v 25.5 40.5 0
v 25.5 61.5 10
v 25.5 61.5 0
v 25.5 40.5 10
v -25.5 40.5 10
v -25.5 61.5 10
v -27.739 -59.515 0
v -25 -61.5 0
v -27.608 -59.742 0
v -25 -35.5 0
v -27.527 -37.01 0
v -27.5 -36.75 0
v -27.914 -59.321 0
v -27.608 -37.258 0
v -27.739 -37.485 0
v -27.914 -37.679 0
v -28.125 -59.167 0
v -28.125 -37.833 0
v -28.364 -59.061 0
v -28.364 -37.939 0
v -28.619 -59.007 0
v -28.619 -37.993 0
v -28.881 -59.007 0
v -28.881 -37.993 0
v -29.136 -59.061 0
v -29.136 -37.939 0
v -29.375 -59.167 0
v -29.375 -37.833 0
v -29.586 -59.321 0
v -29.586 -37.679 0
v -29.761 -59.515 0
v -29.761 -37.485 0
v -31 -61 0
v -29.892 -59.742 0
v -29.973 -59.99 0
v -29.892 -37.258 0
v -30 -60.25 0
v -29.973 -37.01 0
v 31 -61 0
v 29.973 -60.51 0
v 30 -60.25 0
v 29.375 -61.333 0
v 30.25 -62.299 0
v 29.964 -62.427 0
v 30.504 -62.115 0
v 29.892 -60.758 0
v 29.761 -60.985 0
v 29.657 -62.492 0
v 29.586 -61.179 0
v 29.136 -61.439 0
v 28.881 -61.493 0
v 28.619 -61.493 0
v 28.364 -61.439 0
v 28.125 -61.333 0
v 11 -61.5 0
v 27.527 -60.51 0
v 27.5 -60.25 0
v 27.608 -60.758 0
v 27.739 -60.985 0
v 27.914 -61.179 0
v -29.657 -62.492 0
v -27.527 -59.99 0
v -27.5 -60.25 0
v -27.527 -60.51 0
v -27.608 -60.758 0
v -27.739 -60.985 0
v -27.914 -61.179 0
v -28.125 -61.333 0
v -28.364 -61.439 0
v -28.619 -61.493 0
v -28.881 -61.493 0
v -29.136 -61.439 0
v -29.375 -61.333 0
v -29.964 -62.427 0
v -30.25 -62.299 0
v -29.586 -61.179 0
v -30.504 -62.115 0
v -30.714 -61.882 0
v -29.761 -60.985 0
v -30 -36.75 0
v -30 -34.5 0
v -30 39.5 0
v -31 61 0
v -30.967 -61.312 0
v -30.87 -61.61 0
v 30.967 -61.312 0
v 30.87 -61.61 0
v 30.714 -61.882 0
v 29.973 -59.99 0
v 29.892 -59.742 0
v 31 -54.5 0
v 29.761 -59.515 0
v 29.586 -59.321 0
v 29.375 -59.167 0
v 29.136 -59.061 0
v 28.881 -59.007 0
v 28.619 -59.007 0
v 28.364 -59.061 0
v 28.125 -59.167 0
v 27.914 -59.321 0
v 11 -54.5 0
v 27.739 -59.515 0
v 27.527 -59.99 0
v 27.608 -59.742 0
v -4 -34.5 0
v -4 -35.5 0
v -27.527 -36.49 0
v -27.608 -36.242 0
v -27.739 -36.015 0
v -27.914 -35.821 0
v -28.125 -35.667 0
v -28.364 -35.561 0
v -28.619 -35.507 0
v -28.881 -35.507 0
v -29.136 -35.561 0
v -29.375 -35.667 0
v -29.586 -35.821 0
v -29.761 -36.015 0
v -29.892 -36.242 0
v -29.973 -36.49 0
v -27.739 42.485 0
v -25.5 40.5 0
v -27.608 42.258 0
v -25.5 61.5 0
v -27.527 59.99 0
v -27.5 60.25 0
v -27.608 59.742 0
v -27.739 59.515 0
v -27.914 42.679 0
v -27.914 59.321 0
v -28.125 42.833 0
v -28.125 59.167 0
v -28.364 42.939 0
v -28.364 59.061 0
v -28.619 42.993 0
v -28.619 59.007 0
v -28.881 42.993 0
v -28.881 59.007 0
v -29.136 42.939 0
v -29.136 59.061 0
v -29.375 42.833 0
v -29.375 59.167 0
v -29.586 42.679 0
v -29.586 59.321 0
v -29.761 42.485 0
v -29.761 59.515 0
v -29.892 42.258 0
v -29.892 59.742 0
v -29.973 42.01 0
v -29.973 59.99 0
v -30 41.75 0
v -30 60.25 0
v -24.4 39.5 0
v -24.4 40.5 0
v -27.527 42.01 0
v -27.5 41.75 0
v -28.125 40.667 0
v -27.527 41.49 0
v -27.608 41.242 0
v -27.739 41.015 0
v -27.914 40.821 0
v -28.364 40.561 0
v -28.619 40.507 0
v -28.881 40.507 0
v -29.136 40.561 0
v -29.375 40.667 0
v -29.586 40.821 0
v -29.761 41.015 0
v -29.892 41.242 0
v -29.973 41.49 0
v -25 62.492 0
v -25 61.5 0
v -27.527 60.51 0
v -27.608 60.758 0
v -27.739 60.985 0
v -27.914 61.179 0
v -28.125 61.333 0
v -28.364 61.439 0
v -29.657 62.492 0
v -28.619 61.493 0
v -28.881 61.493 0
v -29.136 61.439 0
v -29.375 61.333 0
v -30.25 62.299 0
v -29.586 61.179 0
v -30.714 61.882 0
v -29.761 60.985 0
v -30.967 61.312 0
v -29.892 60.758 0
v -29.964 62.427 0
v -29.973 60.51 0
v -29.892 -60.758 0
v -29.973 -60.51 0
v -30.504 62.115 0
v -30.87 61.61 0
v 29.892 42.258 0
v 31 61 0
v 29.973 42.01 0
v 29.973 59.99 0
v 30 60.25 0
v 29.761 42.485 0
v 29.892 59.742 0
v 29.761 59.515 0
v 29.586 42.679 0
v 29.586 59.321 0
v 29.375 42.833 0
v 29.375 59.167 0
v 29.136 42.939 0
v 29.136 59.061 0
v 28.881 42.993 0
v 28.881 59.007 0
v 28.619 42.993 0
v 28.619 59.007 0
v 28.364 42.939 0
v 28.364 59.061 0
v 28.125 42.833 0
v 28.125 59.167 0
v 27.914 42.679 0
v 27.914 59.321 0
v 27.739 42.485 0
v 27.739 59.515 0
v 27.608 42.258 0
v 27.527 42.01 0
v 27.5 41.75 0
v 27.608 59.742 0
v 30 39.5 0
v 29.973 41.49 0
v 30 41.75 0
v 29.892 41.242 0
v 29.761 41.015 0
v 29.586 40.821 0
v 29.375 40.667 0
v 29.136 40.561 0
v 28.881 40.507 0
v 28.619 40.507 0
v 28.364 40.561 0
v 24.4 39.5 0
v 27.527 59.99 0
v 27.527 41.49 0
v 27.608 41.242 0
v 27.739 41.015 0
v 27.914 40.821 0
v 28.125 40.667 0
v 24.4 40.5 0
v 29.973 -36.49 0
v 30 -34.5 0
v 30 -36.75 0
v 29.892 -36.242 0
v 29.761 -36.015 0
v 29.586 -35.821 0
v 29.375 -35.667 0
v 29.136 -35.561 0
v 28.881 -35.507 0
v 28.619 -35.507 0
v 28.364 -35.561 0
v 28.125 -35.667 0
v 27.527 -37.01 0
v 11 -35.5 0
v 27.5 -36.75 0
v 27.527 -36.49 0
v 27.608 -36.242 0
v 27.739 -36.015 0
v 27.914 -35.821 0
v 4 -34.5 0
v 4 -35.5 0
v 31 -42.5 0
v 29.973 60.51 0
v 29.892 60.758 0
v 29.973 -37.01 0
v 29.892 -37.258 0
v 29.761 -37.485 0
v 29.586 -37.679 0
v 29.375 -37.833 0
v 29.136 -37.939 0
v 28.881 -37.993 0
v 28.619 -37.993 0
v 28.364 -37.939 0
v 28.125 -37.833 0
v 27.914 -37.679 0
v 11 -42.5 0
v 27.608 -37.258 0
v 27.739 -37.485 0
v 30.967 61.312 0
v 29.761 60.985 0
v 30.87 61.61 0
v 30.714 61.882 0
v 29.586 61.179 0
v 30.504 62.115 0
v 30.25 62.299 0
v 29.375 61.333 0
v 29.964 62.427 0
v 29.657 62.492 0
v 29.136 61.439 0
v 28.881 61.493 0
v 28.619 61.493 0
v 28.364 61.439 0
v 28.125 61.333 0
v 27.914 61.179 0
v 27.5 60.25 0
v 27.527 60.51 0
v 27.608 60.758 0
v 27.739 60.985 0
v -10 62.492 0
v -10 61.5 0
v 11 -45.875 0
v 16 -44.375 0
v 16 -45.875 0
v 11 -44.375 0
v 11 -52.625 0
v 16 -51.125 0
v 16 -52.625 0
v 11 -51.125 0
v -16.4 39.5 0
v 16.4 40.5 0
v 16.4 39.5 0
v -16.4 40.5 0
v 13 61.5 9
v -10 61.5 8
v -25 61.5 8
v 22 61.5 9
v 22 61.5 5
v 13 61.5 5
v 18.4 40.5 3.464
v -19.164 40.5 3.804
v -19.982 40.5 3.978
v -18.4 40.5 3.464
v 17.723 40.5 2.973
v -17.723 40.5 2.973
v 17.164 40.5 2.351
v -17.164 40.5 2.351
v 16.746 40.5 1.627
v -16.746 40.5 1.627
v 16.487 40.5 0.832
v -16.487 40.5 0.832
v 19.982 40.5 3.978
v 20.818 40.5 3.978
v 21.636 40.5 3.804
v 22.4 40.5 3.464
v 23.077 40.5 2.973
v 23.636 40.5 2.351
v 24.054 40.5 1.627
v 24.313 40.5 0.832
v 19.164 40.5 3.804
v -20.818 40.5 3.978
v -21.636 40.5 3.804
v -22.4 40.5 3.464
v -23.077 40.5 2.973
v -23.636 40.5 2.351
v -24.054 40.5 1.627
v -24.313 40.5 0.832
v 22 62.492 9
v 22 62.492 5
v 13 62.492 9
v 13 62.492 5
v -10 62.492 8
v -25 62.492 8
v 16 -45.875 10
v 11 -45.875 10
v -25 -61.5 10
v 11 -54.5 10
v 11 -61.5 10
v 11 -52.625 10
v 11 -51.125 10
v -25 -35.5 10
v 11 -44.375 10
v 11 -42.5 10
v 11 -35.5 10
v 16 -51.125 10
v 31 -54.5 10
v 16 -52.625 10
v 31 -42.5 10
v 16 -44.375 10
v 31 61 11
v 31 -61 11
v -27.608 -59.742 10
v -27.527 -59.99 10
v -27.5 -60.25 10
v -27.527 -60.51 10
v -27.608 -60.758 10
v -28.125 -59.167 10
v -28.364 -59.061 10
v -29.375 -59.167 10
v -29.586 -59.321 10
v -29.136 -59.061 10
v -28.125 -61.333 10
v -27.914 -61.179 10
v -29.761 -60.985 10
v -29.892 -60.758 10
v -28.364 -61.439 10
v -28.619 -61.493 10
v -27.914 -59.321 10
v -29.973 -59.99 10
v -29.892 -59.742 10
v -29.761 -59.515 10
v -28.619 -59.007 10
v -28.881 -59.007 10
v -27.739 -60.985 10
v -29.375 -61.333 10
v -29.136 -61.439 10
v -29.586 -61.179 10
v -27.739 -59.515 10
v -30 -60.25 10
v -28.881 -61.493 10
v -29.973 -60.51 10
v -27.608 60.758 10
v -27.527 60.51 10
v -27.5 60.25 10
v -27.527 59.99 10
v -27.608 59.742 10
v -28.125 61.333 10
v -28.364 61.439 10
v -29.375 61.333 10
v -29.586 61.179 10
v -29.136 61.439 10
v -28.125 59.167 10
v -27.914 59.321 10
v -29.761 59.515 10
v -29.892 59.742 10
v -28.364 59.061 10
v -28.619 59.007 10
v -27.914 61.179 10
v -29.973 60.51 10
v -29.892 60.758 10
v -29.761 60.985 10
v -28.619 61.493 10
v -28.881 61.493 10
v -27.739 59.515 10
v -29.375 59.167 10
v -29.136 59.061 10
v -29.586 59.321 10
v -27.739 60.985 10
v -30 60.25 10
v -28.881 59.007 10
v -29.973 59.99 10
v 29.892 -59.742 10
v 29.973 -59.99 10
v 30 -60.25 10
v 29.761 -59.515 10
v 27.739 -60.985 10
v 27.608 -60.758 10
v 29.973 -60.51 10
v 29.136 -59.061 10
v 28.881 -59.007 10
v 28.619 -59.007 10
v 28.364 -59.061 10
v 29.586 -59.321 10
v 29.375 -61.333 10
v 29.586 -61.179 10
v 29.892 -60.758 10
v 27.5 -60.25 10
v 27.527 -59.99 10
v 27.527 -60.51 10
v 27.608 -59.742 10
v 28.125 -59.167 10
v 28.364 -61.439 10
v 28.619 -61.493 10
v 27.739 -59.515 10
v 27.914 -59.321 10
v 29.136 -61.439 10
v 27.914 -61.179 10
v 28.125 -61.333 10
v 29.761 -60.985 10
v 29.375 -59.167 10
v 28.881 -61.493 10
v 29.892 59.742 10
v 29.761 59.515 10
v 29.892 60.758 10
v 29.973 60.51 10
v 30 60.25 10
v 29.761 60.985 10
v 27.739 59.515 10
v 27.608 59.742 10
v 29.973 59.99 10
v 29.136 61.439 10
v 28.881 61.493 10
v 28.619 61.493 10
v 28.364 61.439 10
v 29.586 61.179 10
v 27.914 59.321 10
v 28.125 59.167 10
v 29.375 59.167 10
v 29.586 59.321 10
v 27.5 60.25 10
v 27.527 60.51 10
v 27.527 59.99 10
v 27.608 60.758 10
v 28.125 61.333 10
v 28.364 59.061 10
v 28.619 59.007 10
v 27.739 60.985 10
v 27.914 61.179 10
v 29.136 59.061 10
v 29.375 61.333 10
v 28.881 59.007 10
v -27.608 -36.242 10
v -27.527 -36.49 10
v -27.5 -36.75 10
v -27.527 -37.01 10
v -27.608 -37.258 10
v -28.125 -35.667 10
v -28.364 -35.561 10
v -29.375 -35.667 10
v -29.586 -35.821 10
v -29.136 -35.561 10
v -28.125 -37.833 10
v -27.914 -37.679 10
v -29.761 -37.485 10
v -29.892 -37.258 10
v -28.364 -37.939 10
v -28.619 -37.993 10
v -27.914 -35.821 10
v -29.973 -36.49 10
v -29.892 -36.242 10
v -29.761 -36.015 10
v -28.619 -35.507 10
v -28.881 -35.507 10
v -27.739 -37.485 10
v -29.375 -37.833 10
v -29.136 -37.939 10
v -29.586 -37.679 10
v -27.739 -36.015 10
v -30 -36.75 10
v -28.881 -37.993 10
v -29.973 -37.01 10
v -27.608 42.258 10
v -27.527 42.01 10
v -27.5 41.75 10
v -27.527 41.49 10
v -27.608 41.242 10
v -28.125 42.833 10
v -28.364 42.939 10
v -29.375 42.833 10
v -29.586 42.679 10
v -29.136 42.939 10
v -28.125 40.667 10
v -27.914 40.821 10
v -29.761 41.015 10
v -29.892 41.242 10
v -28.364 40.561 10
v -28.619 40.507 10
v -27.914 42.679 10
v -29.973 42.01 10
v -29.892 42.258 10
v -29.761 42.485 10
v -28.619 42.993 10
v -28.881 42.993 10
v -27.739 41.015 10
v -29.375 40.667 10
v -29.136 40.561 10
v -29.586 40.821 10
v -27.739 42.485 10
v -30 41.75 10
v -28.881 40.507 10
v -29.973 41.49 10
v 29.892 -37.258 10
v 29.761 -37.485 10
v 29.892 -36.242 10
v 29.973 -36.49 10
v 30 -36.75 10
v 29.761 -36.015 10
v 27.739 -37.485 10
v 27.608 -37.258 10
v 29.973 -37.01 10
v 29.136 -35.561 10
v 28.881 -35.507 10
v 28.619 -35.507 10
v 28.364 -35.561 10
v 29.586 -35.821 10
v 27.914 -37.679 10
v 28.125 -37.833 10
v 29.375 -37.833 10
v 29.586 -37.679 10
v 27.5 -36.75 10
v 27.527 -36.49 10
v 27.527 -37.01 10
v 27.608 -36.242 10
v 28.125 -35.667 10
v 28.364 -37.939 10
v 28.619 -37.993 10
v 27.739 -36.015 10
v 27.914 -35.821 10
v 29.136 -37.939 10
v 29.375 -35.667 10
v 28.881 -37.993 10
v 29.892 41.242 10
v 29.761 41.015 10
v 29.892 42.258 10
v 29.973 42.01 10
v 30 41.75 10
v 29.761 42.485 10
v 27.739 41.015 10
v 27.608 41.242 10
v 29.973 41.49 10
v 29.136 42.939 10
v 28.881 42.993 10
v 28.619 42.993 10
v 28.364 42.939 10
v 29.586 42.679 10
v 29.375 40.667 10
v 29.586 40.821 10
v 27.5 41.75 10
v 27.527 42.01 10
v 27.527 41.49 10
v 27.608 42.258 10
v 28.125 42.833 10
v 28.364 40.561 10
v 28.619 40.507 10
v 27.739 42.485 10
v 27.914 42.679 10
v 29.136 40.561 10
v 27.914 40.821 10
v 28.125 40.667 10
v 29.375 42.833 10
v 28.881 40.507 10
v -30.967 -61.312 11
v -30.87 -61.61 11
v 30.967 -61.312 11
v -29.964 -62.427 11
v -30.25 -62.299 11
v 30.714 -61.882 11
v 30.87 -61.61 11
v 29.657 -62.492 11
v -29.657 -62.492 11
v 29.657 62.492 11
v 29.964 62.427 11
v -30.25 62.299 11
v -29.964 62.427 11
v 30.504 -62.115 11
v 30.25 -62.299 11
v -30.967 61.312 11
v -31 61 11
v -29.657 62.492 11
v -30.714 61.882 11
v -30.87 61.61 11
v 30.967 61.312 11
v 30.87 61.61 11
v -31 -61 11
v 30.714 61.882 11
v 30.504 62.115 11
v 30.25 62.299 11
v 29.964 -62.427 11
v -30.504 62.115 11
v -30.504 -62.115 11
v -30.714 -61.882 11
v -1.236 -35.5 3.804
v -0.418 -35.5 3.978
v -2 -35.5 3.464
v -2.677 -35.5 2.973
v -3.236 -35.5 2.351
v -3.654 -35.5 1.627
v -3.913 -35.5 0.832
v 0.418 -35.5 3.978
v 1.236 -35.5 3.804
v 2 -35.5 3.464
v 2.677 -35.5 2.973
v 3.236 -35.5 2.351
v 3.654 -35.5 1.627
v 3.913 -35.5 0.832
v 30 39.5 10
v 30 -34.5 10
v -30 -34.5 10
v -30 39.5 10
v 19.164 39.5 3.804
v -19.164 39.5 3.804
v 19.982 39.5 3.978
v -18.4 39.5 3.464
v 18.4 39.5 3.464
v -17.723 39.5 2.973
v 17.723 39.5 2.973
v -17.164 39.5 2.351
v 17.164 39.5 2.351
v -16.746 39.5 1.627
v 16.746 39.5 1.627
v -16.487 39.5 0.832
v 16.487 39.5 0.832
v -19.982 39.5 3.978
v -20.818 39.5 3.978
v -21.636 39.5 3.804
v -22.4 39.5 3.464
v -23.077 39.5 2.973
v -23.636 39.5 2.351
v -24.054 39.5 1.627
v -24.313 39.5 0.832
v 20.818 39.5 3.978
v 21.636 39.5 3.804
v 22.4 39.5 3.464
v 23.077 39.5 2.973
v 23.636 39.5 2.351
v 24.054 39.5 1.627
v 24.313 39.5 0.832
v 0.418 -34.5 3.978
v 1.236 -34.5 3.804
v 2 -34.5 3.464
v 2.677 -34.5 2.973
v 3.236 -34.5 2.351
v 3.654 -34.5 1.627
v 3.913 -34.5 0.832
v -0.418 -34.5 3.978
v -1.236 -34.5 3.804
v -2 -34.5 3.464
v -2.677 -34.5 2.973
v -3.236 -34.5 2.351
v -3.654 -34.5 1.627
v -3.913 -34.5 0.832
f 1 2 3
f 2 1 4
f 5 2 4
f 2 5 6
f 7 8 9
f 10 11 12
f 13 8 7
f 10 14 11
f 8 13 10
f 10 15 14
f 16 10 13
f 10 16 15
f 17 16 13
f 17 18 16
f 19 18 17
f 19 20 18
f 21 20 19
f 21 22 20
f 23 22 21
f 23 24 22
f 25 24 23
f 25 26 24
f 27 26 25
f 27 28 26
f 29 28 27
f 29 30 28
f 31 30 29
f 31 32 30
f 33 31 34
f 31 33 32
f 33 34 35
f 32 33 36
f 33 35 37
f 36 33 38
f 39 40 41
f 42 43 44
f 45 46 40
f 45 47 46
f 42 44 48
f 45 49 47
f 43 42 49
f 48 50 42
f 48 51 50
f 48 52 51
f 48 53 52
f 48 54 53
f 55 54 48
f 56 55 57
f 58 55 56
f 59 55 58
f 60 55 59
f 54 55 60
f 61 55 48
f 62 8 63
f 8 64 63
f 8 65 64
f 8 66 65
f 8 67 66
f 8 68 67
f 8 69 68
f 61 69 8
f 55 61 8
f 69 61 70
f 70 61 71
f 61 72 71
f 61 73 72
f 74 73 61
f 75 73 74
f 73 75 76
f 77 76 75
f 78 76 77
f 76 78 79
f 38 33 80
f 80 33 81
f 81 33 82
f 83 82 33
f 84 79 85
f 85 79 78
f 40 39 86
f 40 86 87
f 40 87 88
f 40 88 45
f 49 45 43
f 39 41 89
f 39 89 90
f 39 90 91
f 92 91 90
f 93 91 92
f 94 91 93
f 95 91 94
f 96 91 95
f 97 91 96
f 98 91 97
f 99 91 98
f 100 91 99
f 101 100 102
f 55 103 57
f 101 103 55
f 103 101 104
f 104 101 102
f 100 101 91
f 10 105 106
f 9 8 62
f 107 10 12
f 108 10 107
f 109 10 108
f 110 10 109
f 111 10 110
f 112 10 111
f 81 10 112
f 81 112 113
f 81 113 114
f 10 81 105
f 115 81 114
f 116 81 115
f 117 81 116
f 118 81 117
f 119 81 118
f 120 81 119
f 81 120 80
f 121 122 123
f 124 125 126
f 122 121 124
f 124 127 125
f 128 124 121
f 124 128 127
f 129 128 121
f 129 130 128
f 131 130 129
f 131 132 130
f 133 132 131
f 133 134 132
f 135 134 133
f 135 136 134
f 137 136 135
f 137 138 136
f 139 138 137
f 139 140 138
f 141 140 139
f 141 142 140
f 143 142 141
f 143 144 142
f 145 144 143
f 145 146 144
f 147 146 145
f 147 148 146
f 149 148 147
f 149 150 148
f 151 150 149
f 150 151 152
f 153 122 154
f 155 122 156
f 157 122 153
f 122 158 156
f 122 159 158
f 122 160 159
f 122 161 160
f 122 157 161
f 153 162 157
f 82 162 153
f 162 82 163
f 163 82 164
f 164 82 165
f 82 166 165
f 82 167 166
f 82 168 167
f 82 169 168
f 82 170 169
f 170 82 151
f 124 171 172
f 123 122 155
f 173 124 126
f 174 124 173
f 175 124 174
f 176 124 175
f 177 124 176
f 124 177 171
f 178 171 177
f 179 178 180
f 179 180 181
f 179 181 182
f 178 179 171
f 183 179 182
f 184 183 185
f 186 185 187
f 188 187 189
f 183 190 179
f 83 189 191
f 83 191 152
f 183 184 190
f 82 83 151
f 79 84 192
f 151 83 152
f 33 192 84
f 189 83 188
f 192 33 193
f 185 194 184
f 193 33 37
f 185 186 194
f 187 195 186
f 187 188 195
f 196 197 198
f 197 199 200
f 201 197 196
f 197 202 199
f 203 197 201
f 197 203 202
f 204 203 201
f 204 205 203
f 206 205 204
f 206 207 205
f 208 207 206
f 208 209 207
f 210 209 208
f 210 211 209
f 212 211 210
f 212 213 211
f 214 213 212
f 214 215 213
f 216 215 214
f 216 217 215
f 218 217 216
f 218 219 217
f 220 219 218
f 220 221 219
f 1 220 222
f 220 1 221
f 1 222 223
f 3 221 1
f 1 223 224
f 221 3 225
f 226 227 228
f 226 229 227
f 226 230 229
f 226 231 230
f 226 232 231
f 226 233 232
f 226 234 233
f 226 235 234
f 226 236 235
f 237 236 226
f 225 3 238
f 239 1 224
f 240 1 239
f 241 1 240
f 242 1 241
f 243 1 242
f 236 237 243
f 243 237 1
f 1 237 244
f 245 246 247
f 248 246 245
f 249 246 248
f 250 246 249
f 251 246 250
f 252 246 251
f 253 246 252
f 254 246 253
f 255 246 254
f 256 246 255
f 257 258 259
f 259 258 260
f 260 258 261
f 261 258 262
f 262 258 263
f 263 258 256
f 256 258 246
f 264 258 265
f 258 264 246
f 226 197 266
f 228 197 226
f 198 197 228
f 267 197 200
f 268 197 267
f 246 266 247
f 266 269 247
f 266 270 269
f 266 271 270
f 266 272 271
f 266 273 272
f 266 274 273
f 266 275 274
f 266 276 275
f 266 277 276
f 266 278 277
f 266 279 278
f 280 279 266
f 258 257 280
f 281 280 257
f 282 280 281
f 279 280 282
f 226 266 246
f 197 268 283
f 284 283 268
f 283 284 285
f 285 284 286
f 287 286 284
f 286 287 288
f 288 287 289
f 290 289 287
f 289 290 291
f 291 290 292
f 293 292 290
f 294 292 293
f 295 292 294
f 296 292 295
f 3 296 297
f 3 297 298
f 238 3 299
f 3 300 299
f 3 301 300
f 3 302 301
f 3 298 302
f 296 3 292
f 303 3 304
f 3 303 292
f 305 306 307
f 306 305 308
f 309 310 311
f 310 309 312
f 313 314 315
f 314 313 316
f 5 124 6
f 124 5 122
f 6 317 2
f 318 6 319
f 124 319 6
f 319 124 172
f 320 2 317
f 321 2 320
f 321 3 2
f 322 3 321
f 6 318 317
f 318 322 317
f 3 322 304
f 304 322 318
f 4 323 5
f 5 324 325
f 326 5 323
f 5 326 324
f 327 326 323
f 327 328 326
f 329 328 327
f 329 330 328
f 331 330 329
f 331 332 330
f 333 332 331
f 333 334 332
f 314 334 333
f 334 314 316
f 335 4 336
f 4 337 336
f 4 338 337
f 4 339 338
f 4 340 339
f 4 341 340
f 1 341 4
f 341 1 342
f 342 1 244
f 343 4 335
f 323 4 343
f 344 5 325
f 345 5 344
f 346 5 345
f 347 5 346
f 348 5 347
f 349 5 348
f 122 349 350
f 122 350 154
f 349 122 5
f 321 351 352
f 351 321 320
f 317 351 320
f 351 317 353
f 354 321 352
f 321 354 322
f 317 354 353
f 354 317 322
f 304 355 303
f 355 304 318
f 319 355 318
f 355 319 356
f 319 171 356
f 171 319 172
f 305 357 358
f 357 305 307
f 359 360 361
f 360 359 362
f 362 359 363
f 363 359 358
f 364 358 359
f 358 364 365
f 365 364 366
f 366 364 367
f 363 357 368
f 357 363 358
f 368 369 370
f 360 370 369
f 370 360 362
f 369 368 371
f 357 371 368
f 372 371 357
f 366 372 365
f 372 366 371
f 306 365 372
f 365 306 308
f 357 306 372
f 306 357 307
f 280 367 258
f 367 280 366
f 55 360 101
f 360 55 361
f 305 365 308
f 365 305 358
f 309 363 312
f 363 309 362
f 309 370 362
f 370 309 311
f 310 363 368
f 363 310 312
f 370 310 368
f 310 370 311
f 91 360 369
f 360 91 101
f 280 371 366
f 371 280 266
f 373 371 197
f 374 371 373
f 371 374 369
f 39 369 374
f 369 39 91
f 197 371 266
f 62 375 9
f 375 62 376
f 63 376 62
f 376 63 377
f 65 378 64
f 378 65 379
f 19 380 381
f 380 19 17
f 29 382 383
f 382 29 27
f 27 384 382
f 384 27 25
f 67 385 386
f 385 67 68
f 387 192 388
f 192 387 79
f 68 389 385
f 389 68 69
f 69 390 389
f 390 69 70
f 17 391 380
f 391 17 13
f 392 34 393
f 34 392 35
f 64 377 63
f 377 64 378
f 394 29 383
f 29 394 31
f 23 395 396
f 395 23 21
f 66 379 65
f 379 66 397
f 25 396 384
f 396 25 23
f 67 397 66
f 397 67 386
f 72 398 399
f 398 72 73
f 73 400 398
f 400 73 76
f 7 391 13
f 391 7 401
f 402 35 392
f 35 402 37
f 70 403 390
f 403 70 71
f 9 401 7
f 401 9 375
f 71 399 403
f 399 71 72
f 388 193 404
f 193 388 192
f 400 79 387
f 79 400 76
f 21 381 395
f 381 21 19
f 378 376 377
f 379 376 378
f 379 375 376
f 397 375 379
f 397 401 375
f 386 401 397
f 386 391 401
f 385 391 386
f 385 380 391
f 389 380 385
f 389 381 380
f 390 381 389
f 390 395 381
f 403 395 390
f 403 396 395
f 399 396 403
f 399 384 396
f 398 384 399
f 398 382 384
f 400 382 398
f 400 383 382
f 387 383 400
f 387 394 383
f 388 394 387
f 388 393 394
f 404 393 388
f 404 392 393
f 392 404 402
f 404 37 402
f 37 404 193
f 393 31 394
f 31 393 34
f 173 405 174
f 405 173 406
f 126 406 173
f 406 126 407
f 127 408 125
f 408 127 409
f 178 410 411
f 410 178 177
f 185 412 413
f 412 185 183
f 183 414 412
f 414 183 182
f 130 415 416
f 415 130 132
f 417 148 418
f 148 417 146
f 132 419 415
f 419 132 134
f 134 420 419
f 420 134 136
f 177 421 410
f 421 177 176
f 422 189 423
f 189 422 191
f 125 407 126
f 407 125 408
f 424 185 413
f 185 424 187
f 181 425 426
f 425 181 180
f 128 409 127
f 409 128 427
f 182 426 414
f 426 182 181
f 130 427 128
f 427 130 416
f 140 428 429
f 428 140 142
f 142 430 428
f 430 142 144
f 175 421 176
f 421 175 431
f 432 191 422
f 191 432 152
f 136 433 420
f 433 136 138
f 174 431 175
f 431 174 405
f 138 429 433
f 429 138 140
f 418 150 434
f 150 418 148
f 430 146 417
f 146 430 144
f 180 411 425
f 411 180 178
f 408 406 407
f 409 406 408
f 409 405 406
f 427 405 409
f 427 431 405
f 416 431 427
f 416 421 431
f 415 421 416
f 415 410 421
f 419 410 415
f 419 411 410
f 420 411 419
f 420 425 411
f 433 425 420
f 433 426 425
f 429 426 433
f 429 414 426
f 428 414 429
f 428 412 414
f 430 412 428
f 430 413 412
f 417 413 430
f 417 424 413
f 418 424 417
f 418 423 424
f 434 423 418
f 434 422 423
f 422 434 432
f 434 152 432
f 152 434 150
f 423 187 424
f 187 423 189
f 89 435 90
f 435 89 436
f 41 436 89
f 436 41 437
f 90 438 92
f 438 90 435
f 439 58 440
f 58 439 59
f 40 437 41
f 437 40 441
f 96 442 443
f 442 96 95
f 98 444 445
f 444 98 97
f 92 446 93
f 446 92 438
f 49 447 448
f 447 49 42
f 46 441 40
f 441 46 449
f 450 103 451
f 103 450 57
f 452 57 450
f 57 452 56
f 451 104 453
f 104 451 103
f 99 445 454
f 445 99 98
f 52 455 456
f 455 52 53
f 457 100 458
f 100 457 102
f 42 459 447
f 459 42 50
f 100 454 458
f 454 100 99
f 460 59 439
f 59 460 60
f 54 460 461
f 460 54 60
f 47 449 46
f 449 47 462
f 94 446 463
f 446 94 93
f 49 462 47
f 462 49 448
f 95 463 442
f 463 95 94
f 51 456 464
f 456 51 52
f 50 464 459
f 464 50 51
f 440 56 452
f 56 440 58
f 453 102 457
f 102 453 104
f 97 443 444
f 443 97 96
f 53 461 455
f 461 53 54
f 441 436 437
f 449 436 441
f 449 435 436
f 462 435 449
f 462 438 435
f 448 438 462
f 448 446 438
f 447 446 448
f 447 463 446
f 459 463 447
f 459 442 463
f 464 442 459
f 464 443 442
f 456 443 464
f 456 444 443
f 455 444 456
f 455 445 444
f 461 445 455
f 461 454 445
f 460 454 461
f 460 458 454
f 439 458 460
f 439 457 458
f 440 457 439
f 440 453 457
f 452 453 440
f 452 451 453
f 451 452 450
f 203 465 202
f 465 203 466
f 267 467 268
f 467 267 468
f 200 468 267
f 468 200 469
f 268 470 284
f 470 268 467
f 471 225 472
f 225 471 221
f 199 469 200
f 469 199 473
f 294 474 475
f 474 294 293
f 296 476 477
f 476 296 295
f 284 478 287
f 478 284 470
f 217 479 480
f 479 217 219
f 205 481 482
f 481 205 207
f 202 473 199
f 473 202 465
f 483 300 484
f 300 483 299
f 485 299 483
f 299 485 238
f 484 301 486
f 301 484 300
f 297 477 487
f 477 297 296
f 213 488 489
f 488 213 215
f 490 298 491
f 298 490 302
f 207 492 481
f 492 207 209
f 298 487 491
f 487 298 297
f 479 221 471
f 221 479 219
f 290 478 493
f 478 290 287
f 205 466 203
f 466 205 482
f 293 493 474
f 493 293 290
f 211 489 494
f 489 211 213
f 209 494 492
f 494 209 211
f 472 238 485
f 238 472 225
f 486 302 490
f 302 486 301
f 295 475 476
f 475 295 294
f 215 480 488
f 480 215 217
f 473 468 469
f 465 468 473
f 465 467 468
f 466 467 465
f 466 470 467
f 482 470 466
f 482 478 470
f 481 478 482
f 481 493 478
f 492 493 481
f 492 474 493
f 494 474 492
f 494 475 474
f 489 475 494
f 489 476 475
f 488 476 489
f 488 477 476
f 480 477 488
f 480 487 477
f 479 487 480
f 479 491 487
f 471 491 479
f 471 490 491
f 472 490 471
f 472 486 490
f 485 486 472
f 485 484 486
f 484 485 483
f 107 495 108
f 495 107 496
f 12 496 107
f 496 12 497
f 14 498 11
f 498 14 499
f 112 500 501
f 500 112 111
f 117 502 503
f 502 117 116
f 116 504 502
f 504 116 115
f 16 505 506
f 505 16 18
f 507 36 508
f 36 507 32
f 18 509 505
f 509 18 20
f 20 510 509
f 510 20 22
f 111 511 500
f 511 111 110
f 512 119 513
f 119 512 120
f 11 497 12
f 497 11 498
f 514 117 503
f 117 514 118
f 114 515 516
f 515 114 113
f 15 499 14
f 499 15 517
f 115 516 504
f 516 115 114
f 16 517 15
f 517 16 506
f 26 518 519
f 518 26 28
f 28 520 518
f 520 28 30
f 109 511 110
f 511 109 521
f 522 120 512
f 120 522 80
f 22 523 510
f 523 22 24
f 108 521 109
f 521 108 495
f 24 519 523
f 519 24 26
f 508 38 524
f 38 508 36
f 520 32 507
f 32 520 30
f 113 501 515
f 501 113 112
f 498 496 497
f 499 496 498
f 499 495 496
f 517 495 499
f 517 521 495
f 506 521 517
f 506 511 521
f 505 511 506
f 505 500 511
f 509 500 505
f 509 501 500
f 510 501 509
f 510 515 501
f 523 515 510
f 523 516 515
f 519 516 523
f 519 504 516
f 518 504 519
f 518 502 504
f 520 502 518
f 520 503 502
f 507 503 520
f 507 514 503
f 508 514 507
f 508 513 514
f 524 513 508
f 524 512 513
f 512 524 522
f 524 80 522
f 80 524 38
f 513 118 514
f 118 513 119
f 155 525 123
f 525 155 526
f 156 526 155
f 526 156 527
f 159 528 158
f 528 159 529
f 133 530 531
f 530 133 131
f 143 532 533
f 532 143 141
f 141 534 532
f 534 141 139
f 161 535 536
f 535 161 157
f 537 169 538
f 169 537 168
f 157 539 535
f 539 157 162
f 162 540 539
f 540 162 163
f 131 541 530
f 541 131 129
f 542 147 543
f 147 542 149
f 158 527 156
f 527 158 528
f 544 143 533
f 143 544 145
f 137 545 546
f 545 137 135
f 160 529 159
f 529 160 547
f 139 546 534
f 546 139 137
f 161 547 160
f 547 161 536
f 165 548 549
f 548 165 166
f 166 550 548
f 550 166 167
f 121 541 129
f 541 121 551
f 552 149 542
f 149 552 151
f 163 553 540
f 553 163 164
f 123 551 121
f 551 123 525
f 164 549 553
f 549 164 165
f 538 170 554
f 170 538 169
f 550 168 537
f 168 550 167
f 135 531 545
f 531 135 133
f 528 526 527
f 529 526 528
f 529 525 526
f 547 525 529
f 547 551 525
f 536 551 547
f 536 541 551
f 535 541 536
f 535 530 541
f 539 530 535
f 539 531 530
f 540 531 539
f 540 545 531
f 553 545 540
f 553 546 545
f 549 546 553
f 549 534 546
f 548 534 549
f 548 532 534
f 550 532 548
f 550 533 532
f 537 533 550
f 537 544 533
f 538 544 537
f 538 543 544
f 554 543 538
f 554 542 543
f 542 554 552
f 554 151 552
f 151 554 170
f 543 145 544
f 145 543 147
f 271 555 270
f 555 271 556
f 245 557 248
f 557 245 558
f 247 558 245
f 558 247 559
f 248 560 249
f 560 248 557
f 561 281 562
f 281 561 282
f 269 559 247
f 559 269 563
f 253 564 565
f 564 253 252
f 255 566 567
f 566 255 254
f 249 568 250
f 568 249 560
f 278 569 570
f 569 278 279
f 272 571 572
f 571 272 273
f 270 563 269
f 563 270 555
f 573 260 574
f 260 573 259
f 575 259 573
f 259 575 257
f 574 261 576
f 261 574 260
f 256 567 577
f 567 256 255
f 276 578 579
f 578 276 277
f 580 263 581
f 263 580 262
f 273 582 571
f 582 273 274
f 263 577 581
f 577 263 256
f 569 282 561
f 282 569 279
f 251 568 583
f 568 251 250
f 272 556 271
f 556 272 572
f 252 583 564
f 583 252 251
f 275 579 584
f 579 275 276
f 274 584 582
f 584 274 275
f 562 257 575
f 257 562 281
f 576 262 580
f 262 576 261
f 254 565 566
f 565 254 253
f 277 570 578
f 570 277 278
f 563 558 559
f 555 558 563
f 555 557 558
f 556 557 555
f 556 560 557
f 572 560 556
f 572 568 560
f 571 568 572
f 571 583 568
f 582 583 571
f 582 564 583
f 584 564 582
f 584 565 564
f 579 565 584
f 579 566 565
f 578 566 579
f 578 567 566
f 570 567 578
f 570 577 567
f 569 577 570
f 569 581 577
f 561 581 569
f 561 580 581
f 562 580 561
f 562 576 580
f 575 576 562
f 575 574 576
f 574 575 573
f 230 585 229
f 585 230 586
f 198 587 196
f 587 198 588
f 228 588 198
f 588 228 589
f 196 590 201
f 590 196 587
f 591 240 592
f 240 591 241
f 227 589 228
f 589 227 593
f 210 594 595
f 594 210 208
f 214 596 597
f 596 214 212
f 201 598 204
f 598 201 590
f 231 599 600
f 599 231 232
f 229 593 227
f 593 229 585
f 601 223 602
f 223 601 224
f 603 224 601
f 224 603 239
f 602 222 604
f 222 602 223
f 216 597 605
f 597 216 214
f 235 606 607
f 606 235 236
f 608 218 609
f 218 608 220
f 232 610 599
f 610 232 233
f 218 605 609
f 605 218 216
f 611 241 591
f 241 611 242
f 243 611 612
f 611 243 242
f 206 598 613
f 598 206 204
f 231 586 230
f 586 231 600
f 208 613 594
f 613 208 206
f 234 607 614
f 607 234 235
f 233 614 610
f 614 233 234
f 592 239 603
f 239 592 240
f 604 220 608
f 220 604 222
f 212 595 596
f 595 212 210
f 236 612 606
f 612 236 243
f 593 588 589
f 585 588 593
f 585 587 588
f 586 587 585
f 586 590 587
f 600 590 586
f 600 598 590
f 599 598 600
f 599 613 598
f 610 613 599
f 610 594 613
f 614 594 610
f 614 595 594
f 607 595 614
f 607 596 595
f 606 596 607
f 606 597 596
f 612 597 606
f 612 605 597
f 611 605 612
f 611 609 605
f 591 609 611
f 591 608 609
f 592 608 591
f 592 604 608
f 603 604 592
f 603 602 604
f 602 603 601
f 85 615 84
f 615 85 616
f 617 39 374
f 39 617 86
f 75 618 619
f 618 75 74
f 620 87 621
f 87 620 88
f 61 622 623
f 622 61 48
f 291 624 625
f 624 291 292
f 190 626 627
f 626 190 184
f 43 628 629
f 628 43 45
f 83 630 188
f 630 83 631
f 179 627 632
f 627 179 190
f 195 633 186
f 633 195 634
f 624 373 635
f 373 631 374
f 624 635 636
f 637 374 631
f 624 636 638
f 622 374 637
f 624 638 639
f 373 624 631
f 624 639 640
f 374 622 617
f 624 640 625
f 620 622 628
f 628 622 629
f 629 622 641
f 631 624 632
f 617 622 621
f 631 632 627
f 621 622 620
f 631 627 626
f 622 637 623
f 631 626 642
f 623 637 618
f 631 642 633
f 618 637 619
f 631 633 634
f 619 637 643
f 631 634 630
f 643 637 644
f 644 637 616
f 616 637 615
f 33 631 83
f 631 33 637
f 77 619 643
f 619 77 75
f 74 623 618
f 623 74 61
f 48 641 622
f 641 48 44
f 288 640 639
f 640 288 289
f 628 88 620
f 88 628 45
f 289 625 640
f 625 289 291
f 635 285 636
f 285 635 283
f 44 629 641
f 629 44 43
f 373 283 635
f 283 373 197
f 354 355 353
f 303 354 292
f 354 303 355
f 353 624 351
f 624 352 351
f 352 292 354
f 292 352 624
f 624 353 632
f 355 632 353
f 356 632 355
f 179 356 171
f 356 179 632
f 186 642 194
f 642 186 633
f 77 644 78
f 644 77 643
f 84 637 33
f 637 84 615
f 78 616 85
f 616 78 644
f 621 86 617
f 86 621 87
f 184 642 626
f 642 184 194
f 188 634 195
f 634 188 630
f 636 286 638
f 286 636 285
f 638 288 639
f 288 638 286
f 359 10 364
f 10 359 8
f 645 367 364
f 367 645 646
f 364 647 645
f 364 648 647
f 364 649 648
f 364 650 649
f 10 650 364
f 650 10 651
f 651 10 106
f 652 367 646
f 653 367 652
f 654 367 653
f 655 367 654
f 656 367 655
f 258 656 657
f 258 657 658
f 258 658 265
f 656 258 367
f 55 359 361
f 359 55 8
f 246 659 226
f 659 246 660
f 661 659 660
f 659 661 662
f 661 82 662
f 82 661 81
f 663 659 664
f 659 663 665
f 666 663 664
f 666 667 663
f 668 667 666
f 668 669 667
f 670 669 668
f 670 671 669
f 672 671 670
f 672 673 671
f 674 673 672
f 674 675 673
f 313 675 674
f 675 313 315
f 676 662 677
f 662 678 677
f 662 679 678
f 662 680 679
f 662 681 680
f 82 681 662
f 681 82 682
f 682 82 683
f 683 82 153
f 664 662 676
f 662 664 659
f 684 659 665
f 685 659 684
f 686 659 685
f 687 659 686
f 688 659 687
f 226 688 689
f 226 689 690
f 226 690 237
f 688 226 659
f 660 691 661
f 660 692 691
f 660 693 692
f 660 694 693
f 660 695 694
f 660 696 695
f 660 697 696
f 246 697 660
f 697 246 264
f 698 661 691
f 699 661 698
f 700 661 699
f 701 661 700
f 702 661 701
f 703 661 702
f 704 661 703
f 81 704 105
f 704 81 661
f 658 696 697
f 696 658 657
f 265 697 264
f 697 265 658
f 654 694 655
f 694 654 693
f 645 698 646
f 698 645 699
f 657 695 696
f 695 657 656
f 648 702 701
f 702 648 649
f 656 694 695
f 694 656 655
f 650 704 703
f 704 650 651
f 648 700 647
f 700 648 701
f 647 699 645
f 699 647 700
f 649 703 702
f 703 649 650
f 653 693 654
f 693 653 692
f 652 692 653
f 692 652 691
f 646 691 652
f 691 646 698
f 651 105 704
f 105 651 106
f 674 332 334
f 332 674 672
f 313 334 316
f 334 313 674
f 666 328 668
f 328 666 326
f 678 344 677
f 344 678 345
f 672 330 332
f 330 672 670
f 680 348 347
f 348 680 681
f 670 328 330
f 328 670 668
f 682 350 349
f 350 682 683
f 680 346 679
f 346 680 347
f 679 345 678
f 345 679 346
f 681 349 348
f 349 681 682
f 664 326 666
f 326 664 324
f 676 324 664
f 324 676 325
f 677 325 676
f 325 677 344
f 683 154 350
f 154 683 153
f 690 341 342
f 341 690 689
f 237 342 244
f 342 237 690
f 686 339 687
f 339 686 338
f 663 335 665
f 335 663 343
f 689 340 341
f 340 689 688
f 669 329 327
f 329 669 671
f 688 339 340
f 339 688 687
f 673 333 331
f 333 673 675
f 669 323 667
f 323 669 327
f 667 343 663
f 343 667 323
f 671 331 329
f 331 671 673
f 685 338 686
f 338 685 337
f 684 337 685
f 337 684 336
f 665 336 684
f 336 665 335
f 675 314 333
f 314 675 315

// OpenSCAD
WIDTH = 62;
LENGTH = 125;
HEIGHT = 12;
CORNER_DIA = 3;
WALL_THICKNESS = 1;

CHARGER_WIDTH = 36;
CHARGER_LENGTH = 26;
CHARGER_THICKNESS = HEIGHT - 2 * WALL_THICKNESS;
CHARGER_OFFSET = 5;

CONNECTOR_WIDTH = 12;
CONNECTOR_LENGTH = 20;
CONNECTOR_THICKNESS = 10;
CONNECTOR_BASE_WIDTH = 6;
CONNECTOR_BASE_LENGTH = 5;
CONNECTOR_TAB_WIDTH = 1.5;

PSU_LENGTH = 21;
PSU_WIDTH = 51;
PSU_THICKNESS = HEIGHT - 2 * WALL_THICKNESS;

USB_THICKNESS = 8;
USB_WIDTH = 15;
USB_OFFSET_X = PSU_WIDTH/2 - 8;
USB_OFFSET_Z = 6;

MICRO_THICKNESS = 4;
MICRO_WIDTH = 9;
MICRO_OFFSET_X = PSU_WIDTH/2 - 8;
MICRO_OFFSET_Z = 3;

BATTERY_WIDTH = WIDTH - 2 * WALL_THICKNESS;
BATTERY_LENGTH = LENGTH - 4 * WALL_THICKNESS - CHARGER_LENGTH - PSU_LENGTH;
BATTERY_THICKNESS = HEIGHT - 2 * WALL_THICKNESS;
BATTERY_OFFSET = LENGTH/2 - BATTERY_LENGTH/2 - PSU_LENGTH - 2 * WALL_THICKNESS;

MOUNT_HOLE_DIA = 2.5;
MOUNT_HOLE_SPACING_X =  WIDTH - 2 * WALL_THICKNESS - MOUNT_HOLE_DIA;
MOUNT_HOLE_SPACING_Y_1 = LENGTH - 2 * WALL_THICKNESS - MOUNT_HOLE_DIA;
MOUNT_HOLE_SPACING_Y_2 = BATTERY_LENGTH + 2 * WALL_THICKNESS + MOUNT_HOLE_DIA;

WIRE_CHANNEL_DIA = 8;

$fn = 30;

module mount_holes(width, length, height, dia) {
  for(i = [-1, 1]) {
    for(j = [-1, 1]) {
      translate([i * width/2, j * length/2, 0])
      cylinder(d = dia, h = height);
    }
  }
}

module rounded_rect(width, length, height, corner_dia) {
  hull()
  mount_holes(width - corner_dia, length - corner_dia, height, corner_dia);
}

module psu() {
  translate([-PSU_WIDTH/2, -PSU_LENGTH/2, 0])
  cube(size = [PSU_WIDTH, PSU_LENGTH, PSU_THICKNESS]);
  translate([-MICRO_WIDTH/2 + MICRO_OFFSET_X, PSU_LENGTH/2, -MICRO_THICKNESS/2 + PSU_THICKNESS - MICRO_OFFSET_Z])
  cube(size = [MICRO_WIDTH, 2 * WALL_THICKNESS, MICRO_THICKNESS]);

  translate([-USB_WIDTH/2 - USB_OFFSET_X, PSU_LENGTH/2, -USB_THICKNESS/2 + PSU_THICKNESS - USB_OFFSET_Z])
  cube(size = [USB_WIDTH, 2 * WALL_THICKNESS, USB_THICKNESS]);
}

module charger() {
  translate([-CHARGER_WIDTH/2, -CHARGER_LENGTH/2, 0])
  cube(size = [CHARGER_WIDTH, CHARGER_LENGTH, CHARGER_THICKNESS]);
}

module charger_connector() {
  difference() {
    translate([-CONNECTOR_WIDTH/2, -CONNECTOR_LENGTH/2, 0])
    cube(size = [CONNECTOR_WIDTH, CONNECTOR_LENGTH, CONNECTOR_THICKNESS]);

    #for(i = [-1, 1]) {
      translate([i * (CONNECTOR_BASE_WIDTH/2 + CONNECTOR_TAB_WIDTH/4) - CONNECTOR_TAB_WIDTH/2, -CONNECTOR_LENGTH/2, 0])
      cube(size = [CONNECTOR_TAB_WIDTH, CONNECTOR_BASE_LENGTH, CONNECTOR_THICKNESS]);
    }
  }
}

module battery() {
  translate([-BATTERY_WIDTH/2, -BATTERY_LENGTH/2, 0])
  cube(size = [BATTERY_WIDTH, BATTERY_LENGTH, BATTERY_THICKNESS]);
}

module wire_channel() {
  rotate([90, 0, 0])
  cylinder(d = WIRE_CHANNEL_DIA, h = 10, center = true);
}

module mounts() {
  mount_holes(MOUNT_HOLE_SPACING_X, MOUNT_HOLE_SPACING_Y_1, HEIGHT, MOUNT_HOLE_DIA);
  translate([0, BATTERY_OFFSET, 0])
  mount_holes(MOUNT_HOLE_SPACING_X, MOUNT_HOLE_SPACING_Y_2, HEIGHT, MOUNT_HOLE_DIA);
}

module bottom() {
    difference() {
      rounded_rect(WIDTH, LENGTH, HEIGHT - WALL_THICKNESS, CORNER_DIA);

      #translate([0, (LENGTH - PSU_LENGTH)/2 - WALL_THICKNESS, 0])
      psu();

      #translate([-(WIDTH - CHARGER_WIDTH)/2 + WALL_THICKNESS + CHARGER_OFFSET, -(LENGTH - CHARGER_LENGTH)/2 + WALL_THICKNESS, 0])
      charger();

      #translate([(WIDTH - CONNECTOR_LENGTH)/2, -(LENGTH - CHARGER_LENGTH)/2 + WALL_THICKNESS, 0])
      rotate([0, 0, -90])
      charger_connector();

      #translate([0, BATTERY_OFFSET, 0])
      battery();

      #translate([0, 0, - 2 * WALL_THICKNESS])
      mounts();

      #translate([0, -BATTERY_LENGTH/2])
      wire_channel();
      #translate([-PSU_WIDTH/2.5, BATTERY_LENGTH/2])
      wire_channel();
      #translate([PSU_WIDTH/2.5, BATTERY_LENGTH/2])
      wire_channel();
    }
}

module top() {
    difference() {
      rounded_rect(WIDTH, LENGTH, WALL_THICKNESS, CORNER_DIA);
      #mounts();
    }
}

!bottom();
translate([0, 0, -20])
top();
